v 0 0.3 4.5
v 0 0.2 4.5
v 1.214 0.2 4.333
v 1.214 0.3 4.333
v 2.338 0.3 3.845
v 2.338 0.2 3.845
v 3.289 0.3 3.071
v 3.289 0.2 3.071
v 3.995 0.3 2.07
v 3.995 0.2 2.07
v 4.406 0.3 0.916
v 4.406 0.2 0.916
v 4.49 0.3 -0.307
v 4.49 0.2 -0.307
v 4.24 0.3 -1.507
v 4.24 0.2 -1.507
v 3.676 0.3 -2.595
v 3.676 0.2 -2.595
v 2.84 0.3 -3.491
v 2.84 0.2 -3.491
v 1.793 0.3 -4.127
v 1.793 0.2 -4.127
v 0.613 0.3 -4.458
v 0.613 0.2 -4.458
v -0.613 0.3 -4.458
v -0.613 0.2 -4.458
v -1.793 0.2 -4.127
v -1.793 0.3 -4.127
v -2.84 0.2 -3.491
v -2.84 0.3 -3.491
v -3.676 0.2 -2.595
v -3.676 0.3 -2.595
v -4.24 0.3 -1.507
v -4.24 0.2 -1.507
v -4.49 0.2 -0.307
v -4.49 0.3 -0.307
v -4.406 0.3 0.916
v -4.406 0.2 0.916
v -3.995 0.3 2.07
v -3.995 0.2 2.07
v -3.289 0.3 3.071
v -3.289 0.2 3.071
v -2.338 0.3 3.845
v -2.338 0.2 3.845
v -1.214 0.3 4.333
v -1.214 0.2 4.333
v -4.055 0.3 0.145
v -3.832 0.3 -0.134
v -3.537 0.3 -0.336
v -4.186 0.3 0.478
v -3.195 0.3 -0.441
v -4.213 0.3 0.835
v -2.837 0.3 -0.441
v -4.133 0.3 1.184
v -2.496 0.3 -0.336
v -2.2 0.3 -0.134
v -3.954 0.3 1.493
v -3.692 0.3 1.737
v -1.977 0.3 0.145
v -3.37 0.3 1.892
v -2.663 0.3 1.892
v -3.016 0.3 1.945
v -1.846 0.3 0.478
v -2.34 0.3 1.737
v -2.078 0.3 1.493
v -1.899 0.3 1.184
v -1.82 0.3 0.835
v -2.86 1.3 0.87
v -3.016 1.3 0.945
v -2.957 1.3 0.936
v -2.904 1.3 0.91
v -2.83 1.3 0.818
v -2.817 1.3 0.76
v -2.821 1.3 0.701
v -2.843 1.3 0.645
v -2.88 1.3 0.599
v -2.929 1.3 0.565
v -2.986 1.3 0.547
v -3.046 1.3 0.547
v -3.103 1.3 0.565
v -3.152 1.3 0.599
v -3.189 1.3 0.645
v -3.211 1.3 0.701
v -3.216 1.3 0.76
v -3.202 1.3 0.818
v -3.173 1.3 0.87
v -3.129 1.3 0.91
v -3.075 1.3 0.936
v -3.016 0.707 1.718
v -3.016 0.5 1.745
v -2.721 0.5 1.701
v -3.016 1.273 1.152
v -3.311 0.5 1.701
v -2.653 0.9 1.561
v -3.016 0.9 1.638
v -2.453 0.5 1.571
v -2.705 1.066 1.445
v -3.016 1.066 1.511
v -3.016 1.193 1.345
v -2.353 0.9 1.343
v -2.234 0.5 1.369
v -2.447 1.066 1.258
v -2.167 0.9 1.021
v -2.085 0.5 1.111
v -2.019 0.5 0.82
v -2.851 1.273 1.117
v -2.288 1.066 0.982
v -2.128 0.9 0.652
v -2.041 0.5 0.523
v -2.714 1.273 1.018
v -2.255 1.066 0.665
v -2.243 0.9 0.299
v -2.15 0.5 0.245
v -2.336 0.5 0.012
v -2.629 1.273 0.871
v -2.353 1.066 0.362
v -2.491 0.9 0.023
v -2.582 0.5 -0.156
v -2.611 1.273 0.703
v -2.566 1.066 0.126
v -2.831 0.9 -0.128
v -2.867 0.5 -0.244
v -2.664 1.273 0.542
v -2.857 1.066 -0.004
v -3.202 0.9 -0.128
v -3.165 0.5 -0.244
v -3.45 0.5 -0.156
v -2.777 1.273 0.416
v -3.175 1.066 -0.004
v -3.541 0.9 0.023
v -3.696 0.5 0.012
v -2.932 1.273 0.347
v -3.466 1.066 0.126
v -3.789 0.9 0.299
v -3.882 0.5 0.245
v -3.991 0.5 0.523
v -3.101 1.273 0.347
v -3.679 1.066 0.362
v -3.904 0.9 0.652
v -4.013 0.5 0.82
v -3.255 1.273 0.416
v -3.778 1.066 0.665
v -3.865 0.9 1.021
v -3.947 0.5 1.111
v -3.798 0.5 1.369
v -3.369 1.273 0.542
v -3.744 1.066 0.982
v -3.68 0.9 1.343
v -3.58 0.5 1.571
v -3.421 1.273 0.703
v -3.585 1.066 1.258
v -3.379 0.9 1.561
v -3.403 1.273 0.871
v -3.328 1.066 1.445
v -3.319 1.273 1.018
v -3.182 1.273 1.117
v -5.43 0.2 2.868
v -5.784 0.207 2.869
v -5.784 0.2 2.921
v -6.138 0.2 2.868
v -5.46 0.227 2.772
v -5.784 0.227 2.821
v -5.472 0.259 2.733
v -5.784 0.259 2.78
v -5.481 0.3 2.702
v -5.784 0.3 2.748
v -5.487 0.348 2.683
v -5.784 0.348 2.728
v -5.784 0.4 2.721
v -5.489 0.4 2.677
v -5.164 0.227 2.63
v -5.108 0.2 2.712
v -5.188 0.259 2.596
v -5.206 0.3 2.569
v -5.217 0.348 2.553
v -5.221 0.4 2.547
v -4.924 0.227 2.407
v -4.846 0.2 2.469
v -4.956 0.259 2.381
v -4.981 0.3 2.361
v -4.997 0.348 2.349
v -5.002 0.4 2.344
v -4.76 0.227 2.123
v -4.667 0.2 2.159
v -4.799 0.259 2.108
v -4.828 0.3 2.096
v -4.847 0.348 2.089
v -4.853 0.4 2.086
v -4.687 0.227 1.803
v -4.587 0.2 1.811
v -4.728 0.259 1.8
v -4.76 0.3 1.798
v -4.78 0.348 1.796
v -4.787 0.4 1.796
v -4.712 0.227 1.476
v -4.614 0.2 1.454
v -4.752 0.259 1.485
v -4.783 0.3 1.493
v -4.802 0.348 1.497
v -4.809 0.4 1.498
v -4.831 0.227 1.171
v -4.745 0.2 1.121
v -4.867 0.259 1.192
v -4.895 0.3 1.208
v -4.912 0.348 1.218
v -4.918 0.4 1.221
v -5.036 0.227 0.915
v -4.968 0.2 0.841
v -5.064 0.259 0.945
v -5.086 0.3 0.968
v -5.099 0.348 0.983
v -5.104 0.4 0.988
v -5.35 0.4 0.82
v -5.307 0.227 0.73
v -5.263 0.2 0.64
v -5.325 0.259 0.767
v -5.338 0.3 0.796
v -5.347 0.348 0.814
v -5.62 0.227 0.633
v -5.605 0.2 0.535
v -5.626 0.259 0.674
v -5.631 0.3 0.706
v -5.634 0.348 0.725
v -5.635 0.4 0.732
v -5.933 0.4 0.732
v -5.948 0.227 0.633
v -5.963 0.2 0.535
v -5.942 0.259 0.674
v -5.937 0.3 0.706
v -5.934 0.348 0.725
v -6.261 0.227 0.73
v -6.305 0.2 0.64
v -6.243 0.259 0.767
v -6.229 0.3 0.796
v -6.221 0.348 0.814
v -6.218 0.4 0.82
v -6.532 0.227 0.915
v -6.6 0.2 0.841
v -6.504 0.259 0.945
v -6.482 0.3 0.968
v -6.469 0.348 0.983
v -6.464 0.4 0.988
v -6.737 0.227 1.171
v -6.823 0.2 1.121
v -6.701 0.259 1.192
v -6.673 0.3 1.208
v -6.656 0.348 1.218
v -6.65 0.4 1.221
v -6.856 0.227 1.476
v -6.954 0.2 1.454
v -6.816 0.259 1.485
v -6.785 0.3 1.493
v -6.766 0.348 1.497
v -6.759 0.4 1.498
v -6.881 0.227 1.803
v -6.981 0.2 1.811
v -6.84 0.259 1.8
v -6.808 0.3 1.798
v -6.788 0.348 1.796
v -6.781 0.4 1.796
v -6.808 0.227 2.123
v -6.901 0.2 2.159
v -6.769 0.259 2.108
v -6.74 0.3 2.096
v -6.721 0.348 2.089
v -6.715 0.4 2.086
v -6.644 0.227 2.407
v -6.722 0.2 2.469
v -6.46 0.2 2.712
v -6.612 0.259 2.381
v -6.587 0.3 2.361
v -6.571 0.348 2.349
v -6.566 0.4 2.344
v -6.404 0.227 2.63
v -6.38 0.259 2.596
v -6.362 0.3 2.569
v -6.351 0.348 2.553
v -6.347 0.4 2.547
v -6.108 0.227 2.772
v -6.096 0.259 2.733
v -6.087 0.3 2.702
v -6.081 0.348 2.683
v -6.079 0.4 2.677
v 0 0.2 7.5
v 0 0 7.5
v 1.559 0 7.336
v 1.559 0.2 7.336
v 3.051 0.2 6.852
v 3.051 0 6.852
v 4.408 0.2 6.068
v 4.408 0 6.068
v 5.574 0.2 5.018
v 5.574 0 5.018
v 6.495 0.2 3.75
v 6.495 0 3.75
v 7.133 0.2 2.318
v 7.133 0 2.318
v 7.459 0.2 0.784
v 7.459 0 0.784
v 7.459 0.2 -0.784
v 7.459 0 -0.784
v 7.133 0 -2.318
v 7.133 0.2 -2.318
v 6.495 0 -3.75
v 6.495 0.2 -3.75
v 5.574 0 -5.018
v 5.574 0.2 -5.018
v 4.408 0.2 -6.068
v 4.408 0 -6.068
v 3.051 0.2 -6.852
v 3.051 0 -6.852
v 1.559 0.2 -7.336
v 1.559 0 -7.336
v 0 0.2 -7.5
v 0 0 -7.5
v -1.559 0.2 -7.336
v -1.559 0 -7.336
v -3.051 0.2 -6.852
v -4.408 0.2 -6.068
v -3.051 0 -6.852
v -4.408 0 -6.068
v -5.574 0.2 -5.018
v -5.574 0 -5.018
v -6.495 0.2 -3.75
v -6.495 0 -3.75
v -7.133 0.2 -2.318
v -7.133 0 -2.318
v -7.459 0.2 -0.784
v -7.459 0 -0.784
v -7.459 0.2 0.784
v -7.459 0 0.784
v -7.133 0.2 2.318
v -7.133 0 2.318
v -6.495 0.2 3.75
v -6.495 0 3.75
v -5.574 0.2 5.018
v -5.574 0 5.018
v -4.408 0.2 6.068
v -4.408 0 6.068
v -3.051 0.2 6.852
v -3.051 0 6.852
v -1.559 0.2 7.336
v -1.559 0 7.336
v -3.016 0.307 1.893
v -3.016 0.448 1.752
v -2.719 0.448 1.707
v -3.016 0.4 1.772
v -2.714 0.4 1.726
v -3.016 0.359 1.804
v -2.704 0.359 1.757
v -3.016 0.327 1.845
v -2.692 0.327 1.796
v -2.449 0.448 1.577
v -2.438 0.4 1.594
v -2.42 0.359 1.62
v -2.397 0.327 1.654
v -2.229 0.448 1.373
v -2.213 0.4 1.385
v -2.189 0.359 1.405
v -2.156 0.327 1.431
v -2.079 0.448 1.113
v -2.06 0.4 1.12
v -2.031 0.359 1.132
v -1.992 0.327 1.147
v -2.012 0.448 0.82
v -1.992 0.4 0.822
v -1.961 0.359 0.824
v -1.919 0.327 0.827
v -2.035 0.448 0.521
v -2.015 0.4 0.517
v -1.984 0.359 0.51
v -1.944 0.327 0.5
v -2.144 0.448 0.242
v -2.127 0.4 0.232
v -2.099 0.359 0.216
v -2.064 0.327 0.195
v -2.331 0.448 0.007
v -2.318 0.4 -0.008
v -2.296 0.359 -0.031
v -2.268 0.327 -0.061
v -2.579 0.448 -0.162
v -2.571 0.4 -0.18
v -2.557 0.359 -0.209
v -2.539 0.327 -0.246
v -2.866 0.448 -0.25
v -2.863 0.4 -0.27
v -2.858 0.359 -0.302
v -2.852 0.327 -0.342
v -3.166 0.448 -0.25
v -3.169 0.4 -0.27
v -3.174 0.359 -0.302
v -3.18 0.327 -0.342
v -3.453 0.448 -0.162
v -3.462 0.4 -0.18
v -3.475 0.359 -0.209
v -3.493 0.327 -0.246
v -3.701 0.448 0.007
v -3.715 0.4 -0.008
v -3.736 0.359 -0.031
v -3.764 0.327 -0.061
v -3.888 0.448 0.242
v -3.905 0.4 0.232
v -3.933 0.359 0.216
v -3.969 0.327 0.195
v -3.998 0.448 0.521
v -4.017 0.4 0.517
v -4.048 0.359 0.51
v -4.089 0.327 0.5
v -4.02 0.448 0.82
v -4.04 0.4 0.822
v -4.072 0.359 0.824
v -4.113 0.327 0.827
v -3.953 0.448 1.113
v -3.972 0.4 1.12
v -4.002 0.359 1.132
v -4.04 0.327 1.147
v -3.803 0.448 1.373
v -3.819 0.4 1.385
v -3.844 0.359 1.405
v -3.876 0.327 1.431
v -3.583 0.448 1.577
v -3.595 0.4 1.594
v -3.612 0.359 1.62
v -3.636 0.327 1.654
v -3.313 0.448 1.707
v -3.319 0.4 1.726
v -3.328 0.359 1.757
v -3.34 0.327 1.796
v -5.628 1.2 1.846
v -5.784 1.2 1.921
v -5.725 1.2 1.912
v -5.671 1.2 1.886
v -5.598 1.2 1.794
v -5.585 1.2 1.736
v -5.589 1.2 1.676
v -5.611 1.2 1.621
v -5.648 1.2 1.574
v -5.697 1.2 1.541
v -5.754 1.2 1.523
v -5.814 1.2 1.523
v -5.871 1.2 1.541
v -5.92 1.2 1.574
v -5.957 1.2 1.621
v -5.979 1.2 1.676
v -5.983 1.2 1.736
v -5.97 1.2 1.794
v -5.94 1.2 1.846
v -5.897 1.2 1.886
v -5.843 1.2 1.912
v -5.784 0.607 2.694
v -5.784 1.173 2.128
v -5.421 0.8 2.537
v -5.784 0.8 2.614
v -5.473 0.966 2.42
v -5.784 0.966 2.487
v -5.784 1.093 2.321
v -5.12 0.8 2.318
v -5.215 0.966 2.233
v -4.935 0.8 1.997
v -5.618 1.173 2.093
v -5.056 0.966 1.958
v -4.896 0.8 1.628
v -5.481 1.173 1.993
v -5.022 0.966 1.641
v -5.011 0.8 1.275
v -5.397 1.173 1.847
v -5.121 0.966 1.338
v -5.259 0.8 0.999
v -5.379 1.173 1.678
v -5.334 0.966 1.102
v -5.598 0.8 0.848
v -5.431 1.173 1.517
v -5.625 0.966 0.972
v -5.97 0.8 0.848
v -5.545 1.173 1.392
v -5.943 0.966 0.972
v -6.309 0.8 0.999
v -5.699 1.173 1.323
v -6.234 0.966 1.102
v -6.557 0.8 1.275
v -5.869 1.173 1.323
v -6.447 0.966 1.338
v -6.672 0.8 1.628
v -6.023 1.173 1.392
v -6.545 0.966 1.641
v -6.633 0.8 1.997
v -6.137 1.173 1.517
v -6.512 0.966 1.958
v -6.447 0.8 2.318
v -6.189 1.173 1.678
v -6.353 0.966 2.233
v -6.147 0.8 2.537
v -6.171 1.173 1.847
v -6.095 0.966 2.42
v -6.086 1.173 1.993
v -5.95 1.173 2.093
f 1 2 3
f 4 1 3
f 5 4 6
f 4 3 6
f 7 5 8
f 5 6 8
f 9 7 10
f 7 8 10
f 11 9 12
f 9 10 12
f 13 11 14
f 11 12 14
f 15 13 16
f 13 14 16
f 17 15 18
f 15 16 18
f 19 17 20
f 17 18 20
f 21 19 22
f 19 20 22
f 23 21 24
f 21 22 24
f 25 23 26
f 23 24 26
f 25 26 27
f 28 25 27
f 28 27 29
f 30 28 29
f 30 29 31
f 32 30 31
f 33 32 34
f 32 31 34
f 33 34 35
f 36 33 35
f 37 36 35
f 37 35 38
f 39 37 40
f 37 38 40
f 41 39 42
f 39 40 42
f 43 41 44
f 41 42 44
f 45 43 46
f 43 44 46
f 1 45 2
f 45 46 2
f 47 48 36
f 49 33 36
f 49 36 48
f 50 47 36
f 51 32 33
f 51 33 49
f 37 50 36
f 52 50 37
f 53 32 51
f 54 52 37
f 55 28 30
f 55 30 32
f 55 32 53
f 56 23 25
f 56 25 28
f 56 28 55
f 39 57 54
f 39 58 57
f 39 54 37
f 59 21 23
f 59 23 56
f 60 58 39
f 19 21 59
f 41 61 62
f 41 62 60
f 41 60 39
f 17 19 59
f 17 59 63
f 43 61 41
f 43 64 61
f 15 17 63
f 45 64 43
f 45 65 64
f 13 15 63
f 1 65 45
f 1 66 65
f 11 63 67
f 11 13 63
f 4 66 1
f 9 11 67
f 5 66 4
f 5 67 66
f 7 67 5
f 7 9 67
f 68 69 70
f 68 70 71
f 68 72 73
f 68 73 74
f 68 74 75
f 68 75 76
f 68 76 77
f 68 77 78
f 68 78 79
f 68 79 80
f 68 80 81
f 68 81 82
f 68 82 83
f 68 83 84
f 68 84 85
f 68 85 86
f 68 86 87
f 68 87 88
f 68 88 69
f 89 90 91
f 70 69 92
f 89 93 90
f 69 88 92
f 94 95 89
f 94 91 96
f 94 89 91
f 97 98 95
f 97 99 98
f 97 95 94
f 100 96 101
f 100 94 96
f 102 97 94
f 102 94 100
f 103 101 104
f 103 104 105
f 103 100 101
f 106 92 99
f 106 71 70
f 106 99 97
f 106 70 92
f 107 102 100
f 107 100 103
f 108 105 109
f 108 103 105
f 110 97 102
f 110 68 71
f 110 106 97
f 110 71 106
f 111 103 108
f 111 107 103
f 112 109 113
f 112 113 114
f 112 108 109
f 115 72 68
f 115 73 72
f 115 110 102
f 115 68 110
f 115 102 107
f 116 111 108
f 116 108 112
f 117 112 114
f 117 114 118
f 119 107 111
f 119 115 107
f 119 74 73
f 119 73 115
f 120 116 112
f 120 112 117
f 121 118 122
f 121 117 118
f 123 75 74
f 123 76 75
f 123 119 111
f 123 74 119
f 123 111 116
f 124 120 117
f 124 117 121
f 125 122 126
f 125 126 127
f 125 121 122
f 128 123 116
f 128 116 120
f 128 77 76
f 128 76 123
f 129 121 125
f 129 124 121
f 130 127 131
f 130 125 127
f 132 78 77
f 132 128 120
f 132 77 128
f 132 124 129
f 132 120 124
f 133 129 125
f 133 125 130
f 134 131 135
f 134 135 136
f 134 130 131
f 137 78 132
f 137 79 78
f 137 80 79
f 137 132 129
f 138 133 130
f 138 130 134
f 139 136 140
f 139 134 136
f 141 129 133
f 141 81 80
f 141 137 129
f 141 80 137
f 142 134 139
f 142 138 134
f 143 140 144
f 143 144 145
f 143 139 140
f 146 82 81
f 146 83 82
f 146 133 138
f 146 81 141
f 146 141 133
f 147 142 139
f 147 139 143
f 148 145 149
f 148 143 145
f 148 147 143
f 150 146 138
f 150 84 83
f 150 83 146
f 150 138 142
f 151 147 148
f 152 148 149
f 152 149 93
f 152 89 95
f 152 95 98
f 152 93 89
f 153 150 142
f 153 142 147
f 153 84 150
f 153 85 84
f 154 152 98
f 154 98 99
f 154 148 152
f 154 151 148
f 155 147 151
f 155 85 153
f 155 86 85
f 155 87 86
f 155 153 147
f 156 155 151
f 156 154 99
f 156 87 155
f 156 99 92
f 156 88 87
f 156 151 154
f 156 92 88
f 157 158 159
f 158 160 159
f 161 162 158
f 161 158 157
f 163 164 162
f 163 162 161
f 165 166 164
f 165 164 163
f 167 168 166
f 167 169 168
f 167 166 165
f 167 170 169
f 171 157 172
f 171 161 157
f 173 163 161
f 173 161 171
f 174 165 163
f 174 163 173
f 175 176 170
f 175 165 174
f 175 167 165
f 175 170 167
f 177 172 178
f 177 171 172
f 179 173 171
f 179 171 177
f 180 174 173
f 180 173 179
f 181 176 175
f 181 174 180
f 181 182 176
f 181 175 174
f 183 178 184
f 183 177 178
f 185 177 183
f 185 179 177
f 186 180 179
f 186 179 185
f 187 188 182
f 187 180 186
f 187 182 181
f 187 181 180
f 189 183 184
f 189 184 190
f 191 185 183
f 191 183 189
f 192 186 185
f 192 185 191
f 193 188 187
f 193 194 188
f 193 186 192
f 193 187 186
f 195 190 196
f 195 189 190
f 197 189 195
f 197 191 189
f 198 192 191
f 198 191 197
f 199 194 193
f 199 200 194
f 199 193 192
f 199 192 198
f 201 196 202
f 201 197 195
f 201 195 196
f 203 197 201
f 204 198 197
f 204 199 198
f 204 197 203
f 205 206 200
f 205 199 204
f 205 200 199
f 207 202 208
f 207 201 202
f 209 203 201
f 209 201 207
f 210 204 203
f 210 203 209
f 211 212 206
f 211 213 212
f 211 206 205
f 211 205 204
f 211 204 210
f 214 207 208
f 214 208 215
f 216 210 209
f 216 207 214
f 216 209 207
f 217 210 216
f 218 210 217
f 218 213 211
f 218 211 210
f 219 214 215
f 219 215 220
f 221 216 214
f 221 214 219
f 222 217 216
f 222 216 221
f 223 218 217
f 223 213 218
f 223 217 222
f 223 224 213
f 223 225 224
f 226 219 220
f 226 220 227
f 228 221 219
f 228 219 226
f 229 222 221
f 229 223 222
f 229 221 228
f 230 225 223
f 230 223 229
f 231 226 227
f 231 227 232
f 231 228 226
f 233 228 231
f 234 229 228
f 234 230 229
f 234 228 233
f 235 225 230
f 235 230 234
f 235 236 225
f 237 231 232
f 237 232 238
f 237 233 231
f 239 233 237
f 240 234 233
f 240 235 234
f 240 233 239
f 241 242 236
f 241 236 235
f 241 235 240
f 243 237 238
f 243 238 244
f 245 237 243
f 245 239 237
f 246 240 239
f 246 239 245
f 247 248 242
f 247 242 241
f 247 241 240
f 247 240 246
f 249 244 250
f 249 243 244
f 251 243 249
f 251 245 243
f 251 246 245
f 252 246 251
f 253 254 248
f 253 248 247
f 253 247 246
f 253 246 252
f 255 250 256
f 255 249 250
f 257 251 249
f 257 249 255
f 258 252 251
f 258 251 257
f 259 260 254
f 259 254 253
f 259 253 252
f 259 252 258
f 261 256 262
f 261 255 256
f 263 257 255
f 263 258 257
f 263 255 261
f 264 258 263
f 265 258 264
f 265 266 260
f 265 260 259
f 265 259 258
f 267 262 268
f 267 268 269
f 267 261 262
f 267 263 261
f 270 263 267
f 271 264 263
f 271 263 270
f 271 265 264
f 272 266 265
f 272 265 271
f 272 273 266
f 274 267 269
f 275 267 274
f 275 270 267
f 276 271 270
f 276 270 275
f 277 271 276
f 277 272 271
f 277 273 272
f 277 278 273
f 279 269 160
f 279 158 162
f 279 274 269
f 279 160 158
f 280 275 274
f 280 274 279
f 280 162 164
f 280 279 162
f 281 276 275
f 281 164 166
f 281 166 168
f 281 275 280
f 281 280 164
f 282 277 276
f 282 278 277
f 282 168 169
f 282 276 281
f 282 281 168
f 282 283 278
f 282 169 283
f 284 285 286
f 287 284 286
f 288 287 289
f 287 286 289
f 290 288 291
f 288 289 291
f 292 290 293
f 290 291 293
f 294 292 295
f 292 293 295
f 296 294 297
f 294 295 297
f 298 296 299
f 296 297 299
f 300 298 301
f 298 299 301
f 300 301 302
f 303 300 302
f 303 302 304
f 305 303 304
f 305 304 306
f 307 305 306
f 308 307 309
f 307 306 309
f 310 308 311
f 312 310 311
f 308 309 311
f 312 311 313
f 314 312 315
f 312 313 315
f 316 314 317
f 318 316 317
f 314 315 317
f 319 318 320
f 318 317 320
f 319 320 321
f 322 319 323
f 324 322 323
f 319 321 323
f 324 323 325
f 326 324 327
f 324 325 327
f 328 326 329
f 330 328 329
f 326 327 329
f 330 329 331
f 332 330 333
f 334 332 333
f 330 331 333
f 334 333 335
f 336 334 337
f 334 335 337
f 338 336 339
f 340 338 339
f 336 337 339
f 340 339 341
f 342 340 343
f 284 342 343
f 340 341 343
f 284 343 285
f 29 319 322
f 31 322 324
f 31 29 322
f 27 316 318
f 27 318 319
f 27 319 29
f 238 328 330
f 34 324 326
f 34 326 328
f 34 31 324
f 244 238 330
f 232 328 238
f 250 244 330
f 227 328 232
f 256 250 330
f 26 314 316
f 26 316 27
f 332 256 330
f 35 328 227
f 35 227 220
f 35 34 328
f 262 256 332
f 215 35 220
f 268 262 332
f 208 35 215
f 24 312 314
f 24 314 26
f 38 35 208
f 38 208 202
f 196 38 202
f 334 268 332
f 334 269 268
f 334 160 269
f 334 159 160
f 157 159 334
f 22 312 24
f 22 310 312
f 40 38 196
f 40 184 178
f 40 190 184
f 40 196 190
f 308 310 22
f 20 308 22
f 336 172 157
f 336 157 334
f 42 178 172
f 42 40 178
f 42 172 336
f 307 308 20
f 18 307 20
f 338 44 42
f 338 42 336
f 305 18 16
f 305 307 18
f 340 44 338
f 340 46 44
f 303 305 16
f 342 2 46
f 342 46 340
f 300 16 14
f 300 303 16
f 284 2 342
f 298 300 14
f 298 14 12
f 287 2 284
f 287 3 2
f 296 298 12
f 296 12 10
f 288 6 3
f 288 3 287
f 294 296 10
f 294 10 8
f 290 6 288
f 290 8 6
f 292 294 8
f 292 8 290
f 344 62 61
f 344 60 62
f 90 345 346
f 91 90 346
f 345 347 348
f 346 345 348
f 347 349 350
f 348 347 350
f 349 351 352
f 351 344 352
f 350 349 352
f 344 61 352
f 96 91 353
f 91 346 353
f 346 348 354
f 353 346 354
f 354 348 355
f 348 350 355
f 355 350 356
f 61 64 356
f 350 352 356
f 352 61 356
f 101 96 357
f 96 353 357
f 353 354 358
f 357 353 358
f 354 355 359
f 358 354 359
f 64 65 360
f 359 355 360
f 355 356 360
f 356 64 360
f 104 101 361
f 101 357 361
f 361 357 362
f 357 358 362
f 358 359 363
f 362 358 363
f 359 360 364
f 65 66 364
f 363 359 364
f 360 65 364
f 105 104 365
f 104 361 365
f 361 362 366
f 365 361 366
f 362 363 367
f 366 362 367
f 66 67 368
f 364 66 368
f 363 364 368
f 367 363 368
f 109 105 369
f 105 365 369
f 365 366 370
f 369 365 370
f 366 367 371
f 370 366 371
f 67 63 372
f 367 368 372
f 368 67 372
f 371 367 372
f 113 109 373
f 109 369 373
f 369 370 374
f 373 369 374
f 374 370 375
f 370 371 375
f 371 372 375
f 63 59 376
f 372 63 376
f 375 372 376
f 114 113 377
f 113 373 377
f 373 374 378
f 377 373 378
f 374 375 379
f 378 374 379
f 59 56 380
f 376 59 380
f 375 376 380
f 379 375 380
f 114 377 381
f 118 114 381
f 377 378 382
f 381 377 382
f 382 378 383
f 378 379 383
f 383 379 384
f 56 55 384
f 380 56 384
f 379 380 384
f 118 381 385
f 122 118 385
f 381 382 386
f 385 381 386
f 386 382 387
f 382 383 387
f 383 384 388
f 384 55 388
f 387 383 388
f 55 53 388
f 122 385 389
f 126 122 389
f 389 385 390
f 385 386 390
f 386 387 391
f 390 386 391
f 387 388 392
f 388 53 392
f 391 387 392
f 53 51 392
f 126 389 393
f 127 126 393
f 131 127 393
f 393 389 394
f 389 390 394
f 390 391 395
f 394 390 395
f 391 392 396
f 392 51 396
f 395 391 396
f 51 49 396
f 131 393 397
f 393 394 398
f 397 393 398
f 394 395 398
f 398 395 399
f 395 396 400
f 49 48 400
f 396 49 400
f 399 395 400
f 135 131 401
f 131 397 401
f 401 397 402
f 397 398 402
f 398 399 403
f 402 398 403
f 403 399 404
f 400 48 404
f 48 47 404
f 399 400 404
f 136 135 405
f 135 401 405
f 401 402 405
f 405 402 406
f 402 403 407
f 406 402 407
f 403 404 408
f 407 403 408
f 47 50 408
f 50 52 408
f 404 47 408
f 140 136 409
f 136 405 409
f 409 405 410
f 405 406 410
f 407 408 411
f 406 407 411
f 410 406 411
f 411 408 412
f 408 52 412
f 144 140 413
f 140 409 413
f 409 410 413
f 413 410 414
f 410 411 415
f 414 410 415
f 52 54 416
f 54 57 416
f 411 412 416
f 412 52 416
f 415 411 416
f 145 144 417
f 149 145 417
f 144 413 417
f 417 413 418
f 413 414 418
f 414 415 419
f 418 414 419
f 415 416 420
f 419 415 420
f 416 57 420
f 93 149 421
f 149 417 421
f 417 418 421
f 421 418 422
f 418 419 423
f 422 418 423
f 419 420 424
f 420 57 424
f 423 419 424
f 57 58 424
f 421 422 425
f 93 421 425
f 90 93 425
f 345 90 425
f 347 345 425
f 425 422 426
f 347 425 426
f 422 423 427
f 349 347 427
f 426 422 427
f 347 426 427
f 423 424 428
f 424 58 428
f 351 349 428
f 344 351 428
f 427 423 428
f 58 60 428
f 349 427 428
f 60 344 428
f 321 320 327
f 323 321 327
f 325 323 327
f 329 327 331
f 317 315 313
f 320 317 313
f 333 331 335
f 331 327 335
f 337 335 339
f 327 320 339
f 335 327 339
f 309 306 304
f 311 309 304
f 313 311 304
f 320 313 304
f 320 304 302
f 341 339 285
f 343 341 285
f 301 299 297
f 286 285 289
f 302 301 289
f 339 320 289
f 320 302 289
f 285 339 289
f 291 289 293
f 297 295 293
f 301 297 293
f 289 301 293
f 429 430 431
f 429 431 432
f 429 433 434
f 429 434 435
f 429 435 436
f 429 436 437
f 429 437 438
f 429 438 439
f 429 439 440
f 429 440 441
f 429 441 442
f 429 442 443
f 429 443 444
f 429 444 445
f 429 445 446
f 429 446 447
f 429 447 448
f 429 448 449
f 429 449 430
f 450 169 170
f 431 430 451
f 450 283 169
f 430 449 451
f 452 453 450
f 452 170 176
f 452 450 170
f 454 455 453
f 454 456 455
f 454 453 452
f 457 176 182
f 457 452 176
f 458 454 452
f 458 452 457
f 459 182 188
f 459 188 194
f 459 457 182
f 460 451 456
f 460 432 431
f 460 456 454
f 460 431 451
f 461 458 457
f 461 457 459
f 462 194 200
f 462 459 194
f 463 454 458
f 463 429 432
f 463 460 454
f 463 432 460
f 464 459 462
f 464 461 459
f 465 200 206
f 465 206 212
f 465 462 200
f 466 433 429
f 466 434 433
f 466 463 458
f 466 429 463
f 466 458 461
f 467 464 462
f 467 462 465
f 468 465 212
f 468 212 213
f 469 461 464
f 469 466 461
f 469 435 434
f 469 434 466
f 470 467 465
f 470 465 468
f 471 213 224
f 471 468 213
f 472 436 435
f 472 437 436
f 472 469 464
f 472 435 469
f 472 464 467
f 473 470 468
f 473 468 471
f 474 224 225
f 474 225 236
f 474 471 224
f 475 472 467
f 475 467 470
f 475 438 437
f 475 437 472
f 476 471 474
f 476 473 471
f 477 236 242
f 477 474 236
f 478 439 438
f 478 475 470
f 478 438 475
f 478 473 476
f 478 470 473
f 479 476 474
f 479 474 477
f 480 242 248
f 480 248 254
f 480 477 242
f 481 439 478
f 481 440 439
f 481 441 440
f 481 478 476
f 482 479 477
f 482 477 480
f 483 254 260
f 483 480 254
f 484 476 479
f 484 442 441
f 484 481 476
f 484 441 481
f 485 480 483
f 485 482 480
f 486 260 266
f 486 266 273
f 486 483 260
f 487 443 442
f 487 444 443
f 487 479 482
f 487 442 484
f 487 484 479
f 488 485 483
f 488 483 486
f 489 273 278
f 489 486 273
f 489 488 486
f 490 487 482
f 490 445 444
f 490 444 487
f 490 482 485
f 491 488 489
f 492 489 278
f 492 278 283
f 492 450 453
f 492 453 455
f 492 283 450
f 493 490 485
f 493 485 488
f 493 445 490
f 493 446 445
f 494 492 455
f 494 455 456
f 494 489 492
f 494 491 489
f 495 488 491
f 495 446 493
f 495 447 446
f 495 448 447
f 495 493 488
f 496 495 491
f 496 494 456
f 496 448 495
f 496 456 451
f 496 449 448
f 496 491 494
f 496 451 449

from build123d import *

# Parameters (mm, degrees)
SKETCH_1_R      = 7.5
EXTRUDE_1_DEPTH = 0.2
SKETCH_2_R      = 4.5
EXTRUDE_2_DEPTH = 0.1
SKETCH_3_R      = 1
EXTRUDE_3_DEPTH = 1
FILLET_1_R      = 0.8
SKETCH_4_R      = 1
EXTRUDE_4_DEPTH = 1
FILLET_2_R      = 0.8
FILLET_3_R      = 0.2


with BuildPart() as part:
    # 草图1 → 凸台-拉伸1 (new body)
    with BuildSketch(Plane(origin=(0, 0, 0), x_dir=(1, 0, 0), z_dir=(0, 1, 0))):
        with Locations(Location((0, 0, 0), (0, 0, 270))):
            Circle(SKETCH_1_R)
    extrude(amount=EXTRUDE_1_DEPTH)

    # 草图2 → 凸台-拉伸2 (add)
    with BuildSketch(Plane(origin=(0, 0.2, 0), x_dir=(1, 0, 0), z_dir=(0, 1, 0))):
        with Locations(Location((0, 0, 0), (0, 0, 270))):
            Circle(SKETCH_2_R)
    extrude(amount=EXTRUDE_2_DEPTH)

    # 草图3 → 凸台-拉伸3 (add)
    with BuildSketch(Plane(origin=(0, 0.2, 0), x_dir=(1, 0, 0), z_dir=(0, 1, 0))):
        with Locations(Location((-5.78398758, -1.72100244, 0), (0, 0, 270))):
            Circle(SKETCH_3_R)
    extrude(amount=EXTRUDE_3_DEPTH)

    # 圆角1
    fillet_1_edges = [part.edges().sort_by_distance(p)[0] for p in [
        (-5.78398758, 1.2, 0.72100244),
    ]]
    fillet(fillet_1_edges, radius=FILLET_1_R)

    # 草图4 → 凸台-拉伸4 (add)
    with BuildSketch(Plane(origin=(0, 0.3, 0), x_dir=(1, 0, 0), z_dir=(0, 1, 0))):
        with Locations(Location((-3.016189843, -0.745176314, 0), (0, 0, 270))):
            Circle(SKETCH_4_R)
    extrude(amount=EXTRUDE_4_DEPTH)

    # 圆角2
    fillet_2_edges = [part.edges().sort_by_distance(p)[0] for p in [
        (-3.016189843, 1.3, -0.254823686),
    ]]
    fillet(fillet_2_edges, radius=FILLET_2_R)

    # 圆角3
    fillet_3_edges = [part.edges().sort_by_distance(p)[0] for p in [
        (-5.78398758, 0.2, 0.72100244),
        (-3.016189843, 0.3, -0.254823686),
    ]]
    fillet(fillet_3_edges, radius=FILLET_3_R - 0.0001)  # a hair under: the kernel refuses the full size


solid = part.part
